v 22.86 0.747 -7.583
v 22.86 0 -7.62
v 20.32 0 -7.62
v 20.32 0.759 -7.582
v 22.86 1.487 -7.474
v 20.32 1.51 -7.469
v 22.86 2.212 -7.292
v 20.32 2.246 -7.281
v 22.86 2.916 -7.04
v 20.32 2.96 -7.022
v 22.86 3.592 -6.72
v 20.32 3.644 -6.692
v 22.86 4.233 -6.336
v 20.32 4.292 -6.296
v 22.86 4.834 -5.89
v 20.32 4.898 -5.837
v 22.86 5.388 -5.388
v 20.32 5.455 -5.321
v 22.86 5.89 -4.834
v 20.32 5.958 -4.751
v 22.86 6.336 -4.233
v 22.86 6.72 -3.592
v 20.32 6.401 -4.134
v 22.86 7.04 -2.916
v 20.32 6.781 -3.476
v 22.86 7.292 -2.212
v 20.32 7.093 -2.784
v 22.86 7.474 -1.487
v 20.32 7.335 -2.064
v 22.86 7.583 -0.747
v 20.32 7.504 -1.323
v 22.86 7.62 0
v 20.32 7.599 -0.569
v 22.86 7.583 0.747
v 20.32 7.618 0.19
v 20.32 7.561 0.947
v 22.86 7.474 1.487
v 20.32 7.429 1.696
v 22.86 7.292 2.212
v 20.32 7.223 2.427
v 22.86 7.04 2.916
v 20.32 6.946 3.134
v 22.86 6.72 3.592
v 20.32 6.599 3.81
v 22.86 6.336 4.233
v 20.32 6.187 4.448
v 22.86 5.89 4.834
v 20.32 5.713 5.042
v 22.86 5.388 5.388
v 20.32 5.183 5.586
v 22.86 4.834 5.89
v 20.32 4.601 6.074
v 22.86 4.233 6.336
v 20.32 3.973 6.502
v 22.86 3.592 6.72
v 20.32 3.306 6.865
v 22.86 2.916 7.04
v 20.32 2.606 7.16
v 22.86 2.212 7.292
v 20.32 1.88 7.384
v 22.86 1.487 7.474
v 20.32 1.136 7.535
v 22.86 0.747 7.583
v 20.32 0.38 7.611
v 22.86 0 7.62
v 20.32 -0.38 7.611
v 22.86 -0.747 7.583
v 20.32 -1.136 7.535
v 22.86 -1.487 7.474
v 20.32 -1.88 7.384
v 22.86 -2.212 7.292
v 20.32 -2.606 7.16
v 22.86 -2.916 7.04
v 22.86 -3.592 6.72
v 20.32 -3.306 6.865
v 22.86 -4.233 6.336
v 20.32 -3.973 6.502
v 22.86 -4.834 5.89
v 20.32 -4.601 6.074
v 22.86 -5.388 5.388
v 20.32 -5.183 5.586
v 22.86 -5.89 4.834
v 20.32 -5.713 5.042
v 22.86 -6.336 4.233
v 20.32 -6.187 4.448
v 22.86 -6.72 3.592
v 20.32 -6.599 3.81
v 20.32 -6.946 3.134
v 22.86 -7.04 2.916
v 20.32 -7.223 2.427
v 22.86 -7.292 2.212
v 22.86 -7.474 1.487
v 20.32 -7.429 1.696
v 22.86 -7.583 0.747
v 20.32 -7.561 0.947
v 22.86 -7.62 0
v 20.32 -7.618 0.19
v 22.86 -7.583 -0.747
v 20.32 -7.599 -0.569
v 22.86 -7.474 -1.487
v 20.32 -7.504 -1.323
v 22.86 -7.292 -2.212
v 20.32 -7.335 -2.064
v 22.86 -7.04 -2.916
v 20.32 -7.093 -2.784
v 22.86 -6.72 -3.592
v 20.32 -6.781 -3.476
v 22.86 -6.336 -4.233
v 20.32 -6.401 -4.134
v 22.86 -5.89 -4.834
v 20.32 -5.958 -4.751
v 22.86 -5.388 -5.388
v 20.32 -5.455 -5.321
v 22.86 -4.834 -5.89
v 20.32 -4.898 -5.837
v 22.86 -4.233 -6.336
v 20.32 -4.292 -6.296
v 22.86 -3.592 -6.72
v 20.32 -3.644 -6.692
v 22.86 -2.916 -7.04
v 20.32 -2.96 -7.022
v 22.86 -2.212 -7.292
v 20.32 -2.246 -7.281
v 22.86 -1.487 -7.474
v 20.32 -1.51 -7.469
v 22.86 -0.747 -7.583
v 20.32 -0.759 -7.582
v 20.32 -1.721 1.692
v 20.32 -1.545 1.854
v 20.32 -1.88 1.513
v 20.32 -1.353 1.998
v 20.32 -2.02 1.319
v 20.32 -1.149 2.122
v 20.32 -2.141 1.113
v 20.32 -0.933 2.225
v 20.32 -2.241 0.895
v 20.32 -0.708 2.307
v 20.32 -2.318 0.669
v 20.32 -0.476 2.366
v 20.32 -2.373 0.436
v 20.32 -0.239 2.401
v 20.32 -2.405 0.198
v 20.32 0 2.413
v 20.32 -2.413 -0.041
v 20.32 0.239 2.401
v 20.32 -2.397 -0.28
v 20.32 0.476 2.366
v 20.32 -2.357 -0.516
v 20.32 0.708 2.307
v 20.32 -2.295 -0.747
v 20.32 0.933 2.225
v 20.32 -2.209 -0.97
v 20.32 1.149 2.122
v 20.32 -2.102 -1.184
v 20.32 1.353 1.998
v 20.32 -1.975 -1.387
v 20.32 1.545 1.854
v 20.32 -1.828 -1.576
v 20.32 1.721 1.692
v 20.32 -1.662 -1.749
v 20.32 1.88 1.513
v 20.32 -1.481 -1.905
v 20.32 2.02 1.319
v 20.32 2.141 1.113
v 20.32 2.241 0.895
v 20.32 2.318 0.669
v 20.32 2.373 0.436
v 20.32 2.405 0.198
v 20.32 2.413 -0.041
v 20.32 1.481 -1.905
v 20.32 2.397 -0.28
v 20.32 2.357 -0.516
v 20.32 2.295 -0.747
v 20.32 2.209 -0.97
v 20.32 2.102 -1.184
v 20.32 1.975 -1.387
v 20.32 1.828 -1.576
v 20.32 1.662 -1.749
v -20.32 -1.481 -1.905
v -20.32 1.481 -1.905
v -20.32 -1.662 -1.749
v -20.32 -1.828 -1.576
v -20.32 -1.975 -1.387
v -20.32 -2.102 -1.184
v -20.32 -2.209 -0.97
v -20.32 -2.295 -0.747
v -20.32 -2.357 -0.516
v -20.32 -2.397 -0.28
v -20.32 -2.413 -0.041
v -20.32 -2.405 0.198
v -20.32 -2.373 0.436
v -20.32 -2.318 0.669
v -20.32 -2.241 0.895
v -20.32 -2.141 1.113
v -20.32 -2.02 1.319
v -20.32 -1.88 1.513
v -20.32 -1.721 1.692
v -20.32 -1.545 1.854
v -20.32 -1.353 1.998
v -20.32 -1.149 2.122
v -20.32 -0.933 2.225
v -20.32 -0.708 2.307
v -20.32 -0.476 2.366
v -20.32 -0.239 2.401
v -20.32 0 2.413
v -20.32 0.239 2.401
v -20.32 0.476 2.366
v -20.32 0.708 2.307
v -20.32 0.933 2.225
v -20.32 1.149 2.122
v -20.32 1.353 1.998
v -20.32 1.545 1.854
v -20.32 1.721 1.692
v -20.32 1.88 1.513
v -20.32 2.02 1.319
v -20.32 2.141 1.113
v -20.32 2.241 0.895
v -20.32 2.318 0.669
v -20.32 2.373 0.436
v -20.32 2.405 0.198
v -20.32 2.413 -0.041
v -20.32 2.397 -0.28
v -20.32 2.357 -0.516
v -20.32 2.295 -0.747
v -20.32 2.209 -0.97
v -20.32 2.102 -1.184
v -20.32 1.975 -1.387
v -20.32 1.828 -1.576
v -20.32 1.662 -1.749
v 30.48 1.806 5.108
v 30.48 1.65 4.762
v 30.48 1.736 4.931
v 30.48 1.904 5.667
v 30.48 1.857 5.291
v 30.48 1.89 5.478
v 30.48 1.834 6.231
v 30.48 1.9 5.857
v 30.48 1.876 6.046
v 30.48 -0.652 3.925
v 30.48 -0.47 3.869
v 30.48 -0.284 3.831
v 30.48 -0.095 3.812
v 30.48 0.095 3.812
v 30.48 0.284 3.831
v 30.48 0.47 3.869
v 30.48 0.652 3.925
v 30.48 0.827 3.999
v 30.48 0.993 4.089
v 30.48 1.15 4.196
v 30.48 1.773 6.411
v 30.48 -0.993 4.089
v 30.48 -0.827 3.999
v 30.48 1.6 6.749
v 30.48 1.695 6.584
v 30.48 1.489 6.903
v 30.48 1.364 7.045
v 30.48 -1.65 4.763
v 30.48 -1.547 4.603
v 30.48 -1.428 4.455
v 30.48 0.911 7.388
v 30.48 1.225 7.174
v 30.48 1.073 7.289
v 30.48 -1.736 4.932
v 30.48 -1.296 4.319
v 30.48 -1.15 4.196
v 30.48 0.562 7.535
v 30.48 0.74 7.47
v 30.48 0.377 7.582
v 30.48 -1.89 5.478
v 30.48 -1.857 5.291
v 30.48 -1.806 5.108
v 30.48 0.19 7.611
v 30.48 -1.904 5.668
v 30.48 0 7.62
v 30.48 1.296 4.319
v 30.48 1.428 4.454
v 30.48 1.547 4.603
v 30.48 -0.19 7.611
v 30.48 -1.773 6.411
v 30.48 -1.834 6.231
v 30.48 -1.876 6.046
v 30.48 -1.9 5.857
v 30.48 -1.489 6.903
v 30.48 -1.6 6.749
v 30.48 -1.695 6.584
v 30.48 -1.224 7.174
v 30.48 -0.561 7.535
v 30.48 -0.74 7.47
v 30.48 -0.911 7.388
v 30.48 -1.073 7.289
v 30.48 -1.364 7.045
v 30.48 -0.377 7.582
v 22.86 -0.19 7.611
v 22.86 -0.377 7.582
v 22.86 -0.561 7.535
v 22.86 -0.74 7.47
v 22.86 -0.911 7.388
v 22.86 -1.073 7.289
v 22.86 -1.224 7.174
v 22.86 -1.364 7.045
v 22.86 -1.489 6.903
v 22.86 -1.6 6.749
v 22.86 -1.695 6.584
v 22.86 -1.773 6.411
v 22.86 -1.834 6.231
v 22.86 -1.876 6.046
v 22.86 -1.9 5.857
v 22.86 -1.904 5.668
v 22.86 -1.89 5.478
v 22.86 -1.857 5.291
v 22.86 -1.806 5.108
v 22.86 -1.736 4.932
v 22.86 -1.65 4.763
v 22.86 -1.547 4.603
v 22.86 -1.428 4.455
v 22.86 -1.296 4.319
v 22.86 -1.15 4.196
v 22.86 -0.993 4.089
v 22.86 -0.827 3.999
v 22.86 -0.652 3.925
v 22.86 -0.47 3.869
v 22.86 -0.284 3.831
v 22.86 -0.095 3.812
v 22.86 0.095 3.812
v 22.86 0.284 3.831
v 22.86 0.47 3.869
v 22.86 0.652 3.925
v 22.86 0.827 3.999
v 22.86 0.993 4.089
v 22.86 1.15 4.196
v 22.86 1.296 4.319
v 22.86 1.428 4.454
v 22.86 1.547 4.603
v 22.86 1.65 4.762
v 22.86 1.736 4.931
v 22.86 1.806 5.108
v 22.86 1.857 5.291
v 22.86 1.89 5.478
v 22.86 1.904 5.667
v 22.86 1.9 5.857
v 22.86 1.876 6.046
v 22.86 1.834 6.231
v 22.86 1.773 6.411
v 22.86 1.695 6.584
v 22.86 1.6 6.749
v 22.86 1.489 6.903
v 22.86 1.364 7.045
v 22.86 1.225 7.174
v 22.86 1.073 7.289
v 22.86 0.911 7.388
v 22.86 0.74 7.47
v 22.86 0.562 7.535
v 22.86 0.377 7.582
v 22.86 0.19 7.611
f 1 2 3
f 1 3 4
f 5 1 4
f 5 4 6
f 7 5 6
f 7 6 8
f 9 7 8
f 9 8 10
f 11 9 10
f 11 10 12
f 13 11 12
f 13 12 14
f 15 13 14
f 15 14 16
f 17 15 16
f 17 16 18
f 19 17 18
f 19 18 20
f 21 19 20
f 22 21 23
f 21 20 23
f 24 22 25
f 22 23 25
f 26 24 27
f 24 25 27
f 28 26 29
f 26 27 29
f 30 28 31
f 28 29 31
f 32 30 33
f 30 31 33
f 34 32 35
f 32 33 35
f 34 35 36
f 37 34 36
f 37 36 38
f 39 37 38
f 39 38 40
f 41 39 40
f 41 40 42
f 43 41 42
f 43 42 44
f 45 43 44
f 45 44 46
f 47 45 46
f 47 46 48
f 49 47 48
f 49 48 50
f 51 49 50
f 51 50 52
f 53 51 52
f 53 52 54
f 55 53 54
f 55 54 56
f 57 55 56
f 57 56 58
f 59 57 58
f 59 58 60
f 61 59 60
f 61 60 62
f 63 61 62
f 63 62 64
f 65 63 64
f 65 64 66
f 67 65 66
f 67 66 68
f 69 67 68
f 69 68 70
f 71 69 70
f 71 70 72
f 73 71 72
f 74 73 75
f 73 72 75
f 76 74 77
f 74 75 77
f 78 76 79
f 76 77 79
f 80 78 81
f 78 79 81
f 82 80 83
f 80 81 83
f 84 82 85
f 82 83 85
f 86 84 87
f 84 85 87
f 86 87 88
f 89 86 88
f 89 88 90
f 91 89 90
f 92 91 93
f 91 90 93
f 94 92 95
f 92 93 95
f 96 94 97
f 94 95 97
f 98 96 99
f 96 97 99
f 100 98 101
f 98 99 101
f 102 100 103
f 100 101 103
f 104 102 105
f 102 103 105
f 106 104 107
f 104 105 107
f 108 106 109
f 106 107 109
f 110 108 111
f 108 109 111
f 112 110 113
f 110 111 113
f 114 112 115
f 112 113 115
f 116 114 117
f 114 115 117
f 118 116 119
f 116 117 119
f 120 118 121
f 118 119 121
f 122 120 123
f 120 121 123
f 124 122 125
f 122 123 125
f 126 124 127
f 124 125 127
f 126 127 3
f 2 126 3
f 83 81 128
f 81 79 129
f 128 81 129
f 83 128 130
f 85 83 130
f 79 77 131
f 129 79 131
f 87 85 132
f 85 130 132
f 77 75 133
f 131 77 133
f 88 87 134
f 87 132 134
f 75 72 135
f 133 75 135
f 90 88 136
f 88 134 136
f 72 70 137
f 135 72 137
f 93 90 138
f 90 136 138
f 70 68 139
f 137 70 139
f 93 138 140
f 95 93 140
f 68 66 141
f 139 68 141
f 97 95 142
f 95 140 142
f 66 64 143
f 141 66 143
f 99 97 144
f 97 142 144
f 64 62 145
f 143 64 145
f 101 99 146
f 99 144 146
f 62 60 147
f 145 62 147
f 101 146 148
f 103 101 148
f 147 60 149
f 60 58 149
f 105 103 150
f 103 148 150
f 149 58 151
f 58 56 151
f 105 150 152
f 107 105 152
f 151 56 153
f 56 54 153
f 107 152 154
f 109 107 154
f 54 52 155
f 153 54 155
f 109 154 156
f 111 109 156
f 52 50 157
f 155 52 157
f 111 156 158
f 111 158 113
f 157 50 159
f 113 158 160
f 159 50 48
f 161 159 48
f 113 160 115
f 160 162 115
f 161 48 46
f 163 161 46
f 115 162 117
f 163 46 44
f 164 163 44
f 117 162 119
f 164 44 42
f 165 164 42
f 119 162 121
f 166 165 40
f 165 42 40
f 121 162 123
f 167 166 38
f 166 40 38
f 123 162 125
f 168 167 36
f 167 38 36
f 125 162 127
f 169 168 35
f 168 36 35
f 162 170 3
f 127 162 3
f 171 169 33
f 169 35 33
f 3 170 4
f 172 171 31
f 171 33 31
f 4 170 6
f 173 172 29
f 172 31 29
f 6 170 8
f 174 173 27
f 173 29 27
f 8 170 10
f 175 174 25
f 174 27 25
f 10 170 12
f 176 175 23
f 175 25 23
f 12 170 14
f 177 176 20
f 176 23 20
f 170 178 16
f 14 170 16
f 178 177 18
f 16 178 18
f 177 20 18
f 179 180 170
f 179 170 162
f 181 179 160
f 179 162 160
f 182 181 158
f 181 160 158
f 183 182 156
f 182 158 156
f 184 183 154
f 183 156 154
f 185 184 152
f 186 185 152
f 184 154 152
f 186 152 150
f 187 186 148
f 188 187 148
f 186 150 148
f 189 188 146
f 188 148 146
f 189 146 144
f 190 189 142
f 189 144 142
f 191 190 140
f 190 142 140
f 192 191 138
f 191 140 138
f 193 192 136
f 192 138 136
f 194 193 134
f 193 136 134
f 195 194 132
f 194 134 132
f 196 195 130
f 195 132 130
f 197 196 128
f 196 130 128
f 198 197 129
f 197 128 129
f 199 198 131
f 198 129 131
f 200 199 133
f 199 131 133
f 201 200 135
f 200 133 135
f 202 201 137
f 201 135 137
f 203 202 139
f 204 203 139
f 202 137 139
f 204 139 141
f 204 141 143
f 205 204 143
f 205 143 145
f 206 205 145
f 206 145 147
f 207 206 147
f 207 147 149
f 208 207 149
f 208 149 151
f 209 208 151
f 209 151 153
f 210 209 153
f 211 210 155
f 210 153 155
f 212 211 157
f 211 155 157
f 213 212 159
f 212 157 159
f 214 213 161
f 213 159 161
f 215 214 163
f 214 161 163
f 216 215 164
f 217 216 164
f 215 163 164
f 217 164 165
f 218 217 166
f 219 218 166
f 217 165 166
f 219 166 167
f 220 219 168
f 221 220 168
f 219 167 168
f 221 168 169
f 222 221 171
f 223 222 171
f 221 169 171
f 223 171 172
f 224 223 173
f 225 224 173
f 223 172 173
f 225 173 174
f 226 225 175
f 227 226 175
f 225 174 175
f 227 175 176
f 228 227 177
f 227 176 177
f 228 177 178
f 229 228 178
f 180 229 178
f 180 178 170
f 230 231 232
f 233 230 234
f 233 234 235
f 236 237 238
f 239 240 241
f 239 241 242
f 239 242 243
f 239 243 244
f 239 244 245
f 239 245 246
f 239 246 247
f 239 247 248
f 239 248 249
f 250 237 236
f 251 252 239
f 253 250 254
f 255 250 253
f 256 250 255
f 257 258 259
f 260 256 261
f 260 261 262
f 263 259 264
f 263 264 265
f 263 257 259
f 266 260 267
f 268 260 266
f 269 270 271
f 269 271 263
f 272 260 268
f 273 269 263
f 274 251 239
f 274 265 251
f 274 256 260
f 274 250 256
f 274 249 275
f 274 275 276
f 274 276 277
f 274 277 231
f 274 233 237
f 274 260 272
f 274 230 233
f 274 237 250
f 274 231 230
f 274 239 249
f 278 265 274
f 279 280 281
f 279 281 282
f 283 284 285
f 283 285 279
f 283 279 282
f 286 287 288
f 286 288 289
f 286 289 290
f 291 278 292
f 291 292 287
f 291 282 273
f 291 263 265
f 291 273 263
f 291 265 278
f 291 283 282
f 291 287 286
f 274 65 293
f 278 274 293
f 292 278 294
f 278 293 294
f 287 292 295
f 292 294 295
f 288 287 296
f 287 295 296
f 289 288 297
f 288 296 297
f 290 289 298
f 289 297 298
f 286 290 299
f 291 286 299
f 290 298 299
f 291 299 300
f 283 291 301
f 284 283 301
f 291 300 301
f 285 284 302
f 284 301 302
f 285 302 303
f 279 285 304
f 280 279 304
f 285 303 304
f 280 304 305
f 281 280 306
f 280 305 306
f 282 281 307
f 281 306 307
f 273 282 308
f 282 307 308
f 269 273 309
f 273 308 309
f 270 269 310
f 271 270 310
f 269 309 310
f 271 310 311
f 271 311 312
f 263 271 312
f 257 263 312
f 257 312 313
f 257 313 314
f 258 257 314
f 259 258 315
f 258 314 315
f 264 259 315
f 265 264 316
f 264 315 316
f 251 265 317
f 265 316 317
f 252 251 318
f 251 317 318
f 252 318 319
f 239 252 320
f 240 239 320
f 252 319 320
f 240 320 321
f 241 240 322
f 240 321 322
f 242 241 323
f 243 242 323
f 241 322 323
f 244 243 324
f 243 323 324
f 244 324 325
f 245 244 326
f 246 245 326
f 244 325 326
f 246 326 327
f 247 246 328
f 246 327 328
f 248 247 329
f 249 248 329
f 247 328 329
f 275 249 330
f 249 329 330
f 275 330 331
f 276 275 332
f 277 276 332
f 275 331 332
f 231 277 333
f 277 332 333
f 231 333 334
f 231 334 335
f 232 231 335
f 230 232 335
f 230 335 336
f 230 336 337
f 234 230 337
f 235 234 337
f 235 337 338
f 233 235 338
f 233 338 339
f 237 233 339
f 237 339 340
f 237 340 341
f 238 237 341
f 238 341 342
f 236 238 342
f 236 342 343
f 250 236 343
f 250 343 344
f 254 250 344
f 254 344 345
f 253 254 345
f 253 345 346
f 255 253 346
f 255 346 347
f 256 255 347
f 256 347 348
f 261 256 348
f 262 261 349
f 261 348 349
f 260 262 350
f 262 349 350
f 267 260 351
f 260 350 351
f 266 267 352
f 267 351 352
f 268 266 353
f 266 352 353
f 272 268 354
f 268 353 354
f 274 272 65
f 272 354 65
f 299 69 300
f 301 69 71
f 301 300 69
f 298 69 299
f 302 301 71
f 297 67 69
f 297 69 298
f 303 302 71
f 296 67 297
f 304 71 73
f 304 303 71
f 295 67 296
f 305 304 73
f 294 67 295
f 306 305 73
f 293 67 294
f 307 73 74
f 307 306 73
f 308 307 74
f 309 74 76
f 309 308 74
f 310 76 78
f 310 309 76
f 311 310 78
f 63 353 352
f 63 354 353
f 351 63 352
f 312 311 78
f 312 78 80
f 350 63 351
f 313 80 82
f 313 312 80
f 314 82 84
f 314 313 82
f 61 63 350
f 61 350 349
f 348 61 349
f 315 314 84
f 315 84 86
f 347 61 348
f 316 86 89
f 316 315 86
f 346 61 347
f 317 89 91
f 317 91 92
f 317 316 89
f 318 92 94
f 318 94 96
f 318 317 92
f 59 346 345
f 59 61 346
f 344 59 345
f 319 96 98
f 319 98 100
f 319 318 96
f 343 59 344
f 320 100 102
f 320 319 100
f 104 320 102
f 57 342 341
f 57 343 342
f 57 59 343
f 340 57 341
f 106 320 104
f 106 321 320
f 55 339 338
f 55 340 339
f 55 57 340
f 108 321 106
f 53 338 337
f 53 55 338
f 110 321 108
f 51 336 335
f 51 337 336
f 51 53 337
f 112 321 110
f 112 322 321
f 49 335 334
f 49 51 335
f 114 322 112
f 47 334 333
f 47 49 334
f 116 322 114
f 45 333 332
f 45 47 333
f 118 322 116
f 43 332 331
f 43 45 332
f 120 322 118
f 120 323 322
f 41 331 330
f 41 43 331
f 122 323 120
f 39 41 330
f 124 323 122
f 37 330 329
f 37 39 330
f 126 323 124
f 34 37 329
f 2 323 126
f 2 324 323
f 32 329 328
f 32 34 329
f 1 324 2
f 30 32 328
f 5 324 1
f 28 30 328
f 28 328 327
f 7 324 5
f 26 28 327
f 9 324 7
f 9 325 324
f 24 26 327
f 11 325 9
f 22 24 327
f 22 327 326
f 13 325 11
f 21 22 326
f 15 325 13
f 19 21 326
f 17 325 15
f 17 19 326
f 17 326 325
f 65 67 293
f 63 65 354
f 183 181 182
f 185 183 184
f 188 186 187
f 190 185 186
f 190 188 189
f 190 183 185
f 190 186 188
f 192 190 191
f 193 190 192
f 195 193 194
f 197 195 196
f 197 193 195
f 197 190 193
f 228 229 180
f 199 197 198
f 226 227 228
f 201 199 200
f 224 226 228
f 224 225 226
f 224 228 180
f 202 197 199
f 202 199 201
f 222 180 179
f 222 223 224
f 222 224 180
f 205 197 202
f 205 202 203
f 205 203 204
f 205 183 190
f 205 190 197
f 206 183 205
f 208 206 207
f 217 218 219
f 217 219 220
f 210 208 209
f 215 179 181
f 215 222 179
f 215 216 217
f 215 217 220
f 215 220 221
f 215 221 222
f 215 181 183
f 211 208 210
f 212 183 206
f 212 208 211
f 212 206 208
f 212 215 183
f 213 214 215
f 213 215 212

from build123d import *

# Parameters (mm, degrees)
BOSS_EXTRUDE1_DEPTH = 20.32
SKETCH2_R           = 7.62
BOSS_EXTRUDE2_DEPTH = 2.54
SKETCH3_R           = 1.905
BOSS_EXTRUDE3_DEPTH = 7.62


with BuildPart() as part:
    # Sketch1 → Boss-Extrude1 (new, symmetric)
    with BuildSketch(Plane(origin=(0, 0, 0), x_dir=(0, 0, -1), z_dir=(1, 0, 0))):
        with BuildLine():
            Line((1.905, 1.481061781), (1.905, -1.481061781))
            ThreePointArc((1.905, -1.481061781), (-2.413, 0), (1.905, 1.481061781))
        make_face()
    extrude(amount=BOSS_EXTRUDE1_DEPTH, both=True)

    # Sketch2 → Boss-Extrude2 (add)
    with BuildSketch(Plane(origin=(20.32, 0, 0), x_dir=(0, 0, -1), z_dir=(1, 0, 0))):
        Circle(SKETCH2_R)
    extrude(amount=BOSS_EXTRUDE2_DEPTH)

    # Sketch3 → Boss-Extrude3 (add)
    with BuildSketch(Plane(origin=(22.86, 0, 0), x_dir=(0, 0, -1), z_dir=(1, 0, 0))):
        with Locations(Location((-5.715, 0, 0), (0, 0, 179.999322122))):
            Circle(SKETCH3_R)
    extrude(amount=BOSS_EXTRUDE3_DEPTH)


solid = part.part
